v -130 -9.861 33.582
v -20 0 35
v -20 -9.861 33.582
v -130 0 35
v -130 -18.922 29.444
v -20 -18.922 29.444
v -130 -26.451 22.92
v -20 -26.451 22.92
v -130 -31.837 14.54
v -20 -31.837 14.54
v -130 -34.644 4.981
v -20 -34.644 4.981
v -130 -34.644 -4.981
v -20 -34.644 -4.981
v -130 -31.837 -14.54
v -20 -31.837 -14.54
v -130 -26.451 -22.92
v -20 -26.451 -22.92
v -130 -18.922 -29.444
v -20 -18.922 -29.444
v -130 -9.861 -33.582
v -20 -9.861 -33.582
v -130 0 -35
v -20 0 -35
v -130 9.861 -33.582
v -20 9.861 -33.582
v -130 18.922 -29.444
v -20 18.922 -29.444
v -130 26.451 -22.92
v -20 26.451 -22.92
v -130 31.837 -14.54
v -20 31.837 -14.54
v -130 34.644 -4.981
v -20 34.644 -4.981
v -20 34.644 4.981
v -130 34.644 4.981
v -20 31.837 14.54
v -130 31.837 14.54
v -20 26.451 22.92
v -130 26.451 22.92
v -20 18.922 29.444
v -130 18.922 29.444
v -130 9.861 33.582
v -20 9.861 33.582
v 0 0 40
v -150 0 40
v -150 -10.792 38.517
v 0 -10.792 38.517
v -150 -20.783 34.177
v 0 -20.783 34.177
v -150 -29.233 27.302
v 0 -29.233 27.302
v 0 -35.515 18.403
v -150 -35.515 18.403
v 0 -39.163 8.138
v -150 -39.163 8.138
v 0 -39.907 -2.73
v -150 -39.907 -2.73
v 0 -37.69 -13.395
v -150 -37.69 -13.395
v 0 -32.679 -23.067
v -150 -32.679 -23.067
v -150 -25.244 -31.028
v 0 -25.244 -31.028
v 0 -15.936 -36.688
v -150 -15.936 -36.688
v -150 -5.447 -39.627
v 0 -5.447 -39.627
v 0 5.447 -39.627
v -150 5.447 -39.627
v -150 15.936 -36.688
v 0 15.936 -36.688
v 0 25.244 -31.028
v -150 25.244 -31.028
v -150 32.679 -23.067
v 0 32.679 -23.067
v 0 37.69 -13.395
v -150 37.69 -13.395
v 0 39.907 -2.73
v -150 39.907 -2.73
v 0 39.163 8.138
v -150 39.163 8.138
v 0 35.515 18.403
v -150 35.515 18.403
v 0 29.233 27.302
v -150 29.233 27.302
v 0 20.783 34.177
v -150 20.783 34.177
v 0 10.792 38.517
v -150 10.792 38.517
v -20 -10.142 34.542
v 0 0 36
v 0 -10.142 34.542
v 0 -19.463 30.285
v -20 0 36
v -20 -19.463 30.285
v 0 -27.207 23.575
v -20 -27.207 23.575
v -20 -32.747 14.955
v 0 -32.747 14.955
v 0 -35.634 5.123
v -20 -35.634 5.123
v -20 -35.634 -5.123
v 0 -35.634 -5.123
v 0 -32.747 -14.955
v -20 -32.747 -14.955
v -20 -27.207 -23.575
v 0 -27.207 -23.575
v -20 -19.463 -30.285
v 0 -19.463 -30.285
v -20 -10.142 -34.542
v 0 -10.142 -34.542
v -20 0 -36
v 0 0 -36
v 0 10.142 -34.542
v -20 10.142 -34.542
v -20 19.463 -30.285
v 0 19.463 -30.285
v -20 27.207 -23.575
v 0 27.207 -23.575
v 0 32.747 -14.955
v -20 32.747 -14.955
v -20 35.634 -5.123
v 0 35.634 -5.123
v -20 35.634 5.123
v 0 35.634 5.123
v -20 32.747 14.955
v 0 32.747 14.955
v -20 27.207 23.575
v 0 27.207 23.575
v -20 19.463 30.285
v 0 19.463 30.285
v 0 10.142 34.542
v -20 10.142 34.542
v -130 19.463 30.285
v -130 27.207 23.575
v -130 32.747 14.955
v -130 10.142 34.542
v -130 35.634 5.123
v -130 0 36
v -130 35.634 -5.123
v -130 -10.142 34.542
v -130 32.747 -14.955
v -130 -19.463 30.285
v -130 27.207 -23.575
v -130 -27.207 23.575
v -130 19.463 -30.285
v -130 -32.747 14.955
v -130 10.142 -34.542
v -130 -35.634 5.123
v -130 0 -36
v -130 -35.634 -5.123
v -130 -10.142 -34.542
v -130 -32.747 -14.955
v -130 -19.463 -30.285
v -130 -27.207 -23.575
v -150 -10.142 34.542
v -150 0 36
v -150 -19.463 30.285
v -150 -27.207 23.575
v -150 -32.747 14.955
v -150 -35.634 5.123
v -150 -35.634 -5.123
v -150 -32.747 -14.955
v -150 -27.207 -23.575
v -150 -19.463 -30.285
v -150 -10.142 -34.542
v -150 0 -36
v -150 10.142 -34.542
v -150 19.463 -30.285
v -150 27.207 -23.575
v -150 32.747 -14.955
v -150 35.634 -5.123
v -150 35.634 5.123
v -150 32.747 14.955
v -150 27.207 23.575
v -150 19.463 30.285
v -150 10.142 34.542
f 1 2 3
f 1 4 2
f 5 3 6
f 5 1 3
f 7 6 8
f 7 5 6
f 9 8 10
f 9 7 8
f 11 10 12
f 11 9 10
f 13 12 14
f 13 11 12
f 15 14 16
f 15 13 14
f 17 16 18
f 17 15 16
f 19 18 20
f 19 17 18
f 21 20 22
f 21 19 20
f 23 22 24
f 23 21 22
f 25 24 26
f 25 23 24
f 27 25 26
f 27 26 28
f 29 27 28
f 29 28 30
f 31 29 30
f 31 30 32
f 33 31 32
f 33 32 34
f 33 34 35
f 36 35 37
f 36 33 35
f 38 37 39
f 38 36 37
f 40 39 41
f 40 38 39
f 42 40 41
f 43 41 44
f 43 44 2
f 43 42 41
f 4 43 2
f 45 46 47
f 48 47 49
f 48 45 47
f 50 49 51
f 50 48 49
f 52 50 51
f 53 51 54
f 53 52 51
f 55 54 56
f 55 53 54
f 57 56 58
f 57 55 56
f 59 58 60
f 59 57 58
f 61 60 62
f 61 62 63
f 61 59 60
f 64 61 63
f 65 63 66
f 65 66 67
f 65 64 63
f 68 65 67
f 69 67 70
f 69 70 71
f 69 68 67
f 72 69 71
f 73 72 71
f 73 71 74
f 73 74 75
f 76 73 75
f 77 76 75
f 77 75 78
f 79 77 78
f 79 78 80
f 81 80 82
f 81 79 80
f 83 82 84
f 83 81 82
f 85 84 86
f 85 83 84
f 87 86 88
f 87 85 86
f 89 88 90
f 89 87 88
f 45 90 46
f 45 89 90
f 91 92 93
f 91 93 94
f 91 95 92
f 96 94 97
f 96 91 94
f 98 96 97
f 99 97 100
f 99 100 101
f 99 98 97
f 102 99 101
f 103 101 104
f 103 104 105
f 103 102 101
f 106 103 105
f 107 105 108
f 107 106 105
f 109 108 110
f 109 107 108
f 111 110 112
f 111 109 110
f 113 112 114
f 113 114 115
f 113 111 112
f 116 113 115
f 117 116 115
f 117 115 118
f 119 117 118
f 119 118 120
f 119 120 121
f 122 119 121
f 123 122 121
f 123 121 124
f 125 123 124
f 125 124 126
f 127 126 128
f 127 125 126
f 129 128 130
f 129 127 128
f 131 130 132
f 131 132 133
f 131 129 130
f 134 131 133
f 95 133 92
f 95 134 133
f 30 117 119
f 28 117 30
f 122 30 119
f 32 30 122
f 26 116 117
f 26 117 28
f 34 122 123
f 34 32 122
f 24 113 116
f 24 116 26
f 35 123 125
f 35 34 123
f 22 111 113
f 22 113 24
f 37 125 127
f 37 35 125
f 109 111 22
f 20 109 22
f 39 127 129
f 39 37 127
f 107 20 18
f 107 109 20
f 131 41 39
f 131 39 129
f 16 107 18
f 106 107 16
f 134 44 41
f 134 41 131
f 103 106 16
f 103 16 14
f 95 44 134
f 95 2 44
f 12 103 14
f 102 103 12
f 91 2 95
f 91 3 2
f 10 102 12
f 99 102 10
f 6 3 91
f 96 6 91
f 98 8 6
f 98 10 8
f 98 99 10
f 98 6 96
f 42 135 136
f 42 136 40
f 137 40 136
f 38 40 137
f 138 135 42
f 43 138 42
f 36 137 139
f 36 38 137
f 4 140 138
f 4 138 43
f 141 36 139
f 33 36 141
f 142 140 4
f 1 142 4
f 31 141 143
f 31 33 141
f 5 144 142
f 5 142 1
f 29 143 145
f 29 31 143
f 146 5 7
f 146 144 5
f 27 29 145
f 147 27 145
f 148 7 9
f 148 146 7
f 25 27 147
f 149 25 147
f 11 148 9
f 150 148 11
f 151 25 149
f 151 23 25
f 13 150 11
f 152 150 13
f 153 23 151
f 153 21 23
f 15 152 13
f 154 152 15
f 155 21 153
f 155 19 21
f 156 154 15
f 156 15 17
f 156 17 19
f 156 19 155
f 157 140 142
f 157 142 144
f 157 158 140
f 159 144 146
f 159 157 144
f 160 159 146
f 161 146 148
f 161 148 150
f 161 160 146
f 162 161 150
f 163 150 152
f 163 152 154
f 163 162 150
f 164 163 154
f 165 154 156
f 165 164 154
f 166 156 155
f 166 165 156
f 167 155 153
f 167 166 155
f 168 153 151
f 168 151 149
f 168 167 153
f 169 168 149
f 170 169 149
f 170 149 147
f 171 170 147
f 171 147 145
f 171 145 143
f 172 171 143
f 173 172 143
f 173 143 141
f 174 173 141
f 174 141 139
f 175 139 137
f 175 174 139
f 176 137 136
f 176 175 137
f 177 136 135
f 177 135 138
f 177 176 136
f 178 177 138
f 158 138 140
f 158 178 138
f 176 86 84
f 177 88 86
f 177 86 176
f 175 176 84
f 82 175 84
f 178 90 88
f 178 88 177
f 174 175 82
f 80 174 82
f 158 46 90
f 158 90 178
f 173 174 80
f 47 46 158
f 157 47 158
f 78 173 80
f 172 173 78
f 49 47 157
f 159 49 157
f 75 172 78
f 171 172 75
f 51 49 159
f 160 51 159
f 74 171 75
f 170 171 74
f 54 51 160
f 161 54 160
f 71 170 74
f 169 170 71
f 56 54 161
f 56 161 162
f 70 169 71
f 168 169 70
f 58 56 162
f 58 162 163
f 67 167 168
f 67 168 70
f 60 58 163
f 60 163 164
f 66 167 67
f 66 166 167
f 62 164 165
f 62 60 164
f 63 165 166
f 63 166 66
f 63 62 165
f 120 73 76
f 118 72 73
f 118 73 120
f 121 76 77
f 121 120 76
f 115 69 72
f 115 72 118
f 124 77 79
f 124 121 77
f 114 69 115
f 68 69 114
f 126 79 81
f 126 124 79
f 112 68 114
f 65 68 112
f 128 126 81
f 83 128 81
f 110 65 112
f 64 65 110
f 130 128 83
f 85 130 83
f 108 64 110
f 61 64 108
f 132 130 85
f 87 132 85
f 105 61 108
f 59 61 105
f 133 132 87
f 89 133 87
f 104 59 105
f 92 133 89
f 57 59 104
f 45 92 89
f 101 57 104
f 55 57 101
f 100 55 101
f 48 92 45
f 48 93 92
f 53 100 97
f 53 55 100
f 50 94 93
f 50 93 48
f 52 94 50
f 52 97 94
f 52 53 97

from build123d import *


with BuildPart() as part:
    # Çizim1 → Döndür1 (revolve)
    with BuildSketch(Plane.XY, mode=Mode.PRIVATE) as d_nd_r1_sk:
        Polygon((-150, 40), (0, 40), (0, 36), (-20, 36), (-20, 35), (-130, 35), (-130, 36), (-150, 36), align=None)
    revolve(d_nd_r1_sk.sketch.rotate(Axis((-88.99, 0, 0), (1, 0, 0)), 90), axis=Axis((-88.99, 0, 0), (1, 0, 0)))


solid = part.part
